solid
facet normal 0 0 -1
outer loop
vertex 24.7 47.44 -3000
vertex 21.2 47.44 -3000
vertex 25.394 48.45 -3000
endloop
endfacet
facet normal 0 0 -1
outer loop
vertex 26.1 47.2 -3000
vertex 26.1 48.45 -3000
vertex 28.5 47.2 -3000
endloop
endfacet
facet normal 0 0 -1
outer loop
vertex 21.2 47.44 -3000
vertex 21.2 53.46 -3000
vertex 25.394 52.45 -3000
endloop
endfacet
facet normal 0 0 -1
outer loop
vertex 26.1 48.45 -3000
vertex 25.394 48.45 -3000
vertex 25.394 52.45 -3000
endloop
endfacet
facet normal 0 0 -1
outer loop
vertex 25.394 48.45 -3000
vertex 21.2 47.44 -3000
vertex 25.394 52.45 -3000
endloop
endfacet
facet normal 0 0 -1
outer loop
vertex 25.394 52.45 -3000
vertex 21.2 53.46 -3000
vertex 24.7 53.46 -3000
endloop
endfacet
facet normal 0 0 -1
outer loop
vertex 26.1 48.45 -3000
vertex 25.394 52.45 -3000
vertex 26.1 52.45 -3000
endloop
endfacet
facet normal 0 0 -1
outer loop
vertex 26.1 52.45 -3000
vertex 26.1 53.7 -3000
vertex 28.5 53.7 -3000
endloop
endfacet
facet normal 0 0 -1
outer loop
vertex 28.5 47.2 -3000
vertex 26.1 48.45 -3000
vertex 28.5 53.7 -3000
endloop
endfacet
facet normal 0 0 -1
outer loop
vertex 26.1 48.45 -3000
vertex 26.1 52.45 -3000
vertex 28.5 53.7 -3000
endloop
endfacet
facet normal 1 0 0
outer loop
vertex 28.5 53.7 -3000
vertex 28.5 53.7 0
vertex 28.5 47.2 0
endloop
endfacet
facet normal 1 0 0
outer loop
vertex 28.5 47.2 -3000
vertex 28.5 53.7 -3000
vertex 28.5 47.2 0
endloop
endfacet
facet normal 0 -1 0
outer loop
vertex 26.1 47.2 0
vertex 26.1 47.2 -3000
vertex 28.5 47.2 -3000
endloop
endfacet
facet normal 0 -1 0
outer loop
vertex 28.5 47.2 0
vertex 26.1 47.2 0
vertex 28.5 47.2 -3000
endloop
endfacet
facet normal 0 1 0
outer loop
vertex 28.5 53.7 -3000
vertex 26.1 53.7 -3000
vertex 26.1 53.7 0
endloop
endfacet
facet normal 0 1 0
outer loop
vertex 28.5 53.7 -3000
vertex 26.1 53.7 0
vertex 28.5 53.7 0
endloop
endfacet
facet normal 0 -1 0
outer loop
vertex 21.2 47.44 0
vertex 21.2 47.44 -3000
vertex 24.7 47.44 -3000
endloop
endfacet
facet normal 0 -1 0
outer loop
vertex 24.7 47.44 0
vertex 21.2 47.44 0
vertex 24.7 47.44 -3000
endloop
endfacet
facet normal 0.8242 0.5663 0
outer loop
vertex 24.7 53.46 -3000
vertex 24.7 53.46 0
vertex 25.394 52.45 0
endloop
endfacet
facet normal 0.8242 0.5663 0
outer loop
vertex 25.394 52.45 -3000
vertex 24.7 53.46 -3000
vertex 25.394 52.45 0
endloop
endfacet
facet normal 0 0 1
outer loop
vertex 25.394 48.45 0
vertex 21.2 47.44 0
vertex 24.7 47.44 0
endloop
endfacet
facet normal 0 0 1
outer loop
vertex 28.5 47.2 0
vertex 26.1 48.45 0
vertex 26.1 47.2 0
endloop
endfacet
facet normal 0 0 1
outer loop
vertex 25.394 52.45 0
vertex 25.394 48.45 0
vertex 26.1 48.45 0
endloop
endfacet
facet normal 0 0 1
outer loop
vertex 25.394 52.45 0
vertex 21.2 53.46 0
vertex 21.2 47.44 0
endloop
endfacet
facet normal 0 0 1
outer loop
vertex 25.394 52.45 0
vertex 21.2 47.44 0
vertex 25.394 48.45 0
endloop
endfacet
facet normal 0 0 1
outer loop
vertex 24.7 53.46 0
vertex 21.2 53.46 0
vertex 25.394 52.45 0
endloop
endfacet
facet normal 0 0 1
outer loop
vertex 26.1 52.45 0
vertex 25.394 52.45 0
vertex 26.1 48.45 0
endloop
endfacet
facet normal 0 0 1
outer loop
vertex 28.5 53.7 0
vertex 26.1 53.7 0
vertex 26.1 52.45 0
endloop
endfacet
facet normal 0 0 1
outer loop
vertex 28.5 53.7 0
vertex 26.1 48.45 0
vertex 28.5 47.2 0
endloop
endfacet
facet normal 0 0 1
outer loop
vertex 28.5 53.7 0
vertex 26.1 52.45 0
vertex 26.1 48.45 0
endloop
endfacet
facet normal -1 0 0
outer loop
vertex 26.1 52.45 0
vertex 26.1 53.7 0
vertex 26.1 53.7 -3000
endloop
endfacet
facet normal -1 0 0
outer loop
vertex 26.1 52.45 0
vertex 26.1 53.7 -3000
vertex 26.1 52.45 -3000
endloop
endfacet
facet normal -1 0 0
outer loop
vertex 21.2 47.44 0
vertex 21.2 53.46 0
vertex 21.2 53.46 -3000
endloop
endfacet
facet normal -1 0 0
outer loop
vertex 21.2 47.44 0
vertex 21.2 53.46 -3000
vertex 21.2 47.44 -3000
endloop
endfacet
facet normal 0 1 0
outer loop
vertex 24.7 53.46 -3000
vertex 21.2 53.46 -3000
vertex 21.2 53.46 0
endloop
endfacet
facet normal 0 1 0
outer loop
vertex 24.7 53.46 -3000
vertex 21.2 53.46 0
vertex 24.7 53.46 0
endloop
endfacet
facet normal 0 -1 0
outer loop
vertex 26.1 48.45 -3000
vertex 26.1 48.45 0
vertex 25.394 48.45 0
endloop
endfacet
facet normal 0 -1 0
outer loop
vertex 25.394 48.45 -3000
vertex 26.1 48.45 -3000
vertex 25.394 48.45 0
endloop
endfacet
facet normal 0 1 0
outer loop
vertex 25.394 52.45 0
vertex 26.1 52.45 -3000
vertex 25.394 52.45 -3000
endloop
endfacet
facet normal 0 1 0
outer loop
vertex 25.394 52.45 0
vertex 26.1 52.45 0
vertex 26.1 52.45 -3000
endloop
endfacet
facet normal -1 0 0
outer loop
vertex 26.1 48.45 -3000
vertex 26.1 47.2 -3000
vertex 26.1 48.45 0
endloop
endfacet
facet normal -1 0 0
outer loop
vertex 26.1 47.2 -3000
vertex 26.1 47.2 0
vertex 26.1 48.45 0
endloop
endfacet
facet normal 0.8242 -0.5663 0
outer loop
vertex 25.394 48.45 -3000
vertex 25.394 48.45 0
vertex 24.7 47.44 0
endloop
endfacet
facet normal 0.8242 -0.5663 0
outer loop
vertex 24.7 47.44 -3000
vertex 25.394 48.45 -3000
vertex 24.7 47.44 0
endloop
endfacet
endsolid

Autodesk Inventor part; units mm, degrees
ref_plane "YZ Plane" through (0, 0, 0) normal (1, 0, 0) x (0, 1, 0)
ref_plane "XZ Plane" through (0, 0, 0) normal (0, 1, 0) x (-1, 0, 0)
ref_plane "XY Plane" through (0, 0, 0) normal (0, 0, 1) x (1, 0, 0)
sketch "Boceto1" plane through (0, 0, 0) normal (0, 0, 1) x (1, 0, 0)
  line L0 (28.5, 53.7) -> (28.5, 47.2)
  line L1 (26.1, 47.2) -> (28.5, 47.2)
  line L2 (26.1, 48.45) -> (25.3942, 48.45)
  line L3 (25.3942, 48.45) -> (24.7, 47.44)
  line L4 (26.1, 52.45) -> (25.3942, 52.45)
  line L5 (26.1, 53.7) -> (28.5, 53.7)
  line L6 (24.7, 53.46) -> (25.3942, 52.45)
  line L7 (26.1, 53.7) -> (26.1, 52.45)
  line L8 (26.1, 47.2) -> (26.1, 48.45)
  line L9 (21.2, 53.46) -> (24.7, 53.46)
  line L10 (21.2, 47.44) -> (24.7, 47.44)
  line L11 (21.2, 53.46) -> (21.2, 47.44)
  point P0 (28.5, 50.45)
  dimension "d78" = 6.5
  dimension "d88" = 2.4
  dimension "d95" = 6.02
  dimension "d100" = 2.4
  dimension "d108" = 4
  dimension "d109" = 0.7058
  dimension "d110" = 0.7058
  dimension "d145" = 2
  dimension "d146" = 2
  dimension "d150" = 3.5
extrude "Extrusión1" add sketch "Boceto1" against normal blind 3000
properties part number "SP40-02 JUNTA INT 207" material "Caucho, negro"
